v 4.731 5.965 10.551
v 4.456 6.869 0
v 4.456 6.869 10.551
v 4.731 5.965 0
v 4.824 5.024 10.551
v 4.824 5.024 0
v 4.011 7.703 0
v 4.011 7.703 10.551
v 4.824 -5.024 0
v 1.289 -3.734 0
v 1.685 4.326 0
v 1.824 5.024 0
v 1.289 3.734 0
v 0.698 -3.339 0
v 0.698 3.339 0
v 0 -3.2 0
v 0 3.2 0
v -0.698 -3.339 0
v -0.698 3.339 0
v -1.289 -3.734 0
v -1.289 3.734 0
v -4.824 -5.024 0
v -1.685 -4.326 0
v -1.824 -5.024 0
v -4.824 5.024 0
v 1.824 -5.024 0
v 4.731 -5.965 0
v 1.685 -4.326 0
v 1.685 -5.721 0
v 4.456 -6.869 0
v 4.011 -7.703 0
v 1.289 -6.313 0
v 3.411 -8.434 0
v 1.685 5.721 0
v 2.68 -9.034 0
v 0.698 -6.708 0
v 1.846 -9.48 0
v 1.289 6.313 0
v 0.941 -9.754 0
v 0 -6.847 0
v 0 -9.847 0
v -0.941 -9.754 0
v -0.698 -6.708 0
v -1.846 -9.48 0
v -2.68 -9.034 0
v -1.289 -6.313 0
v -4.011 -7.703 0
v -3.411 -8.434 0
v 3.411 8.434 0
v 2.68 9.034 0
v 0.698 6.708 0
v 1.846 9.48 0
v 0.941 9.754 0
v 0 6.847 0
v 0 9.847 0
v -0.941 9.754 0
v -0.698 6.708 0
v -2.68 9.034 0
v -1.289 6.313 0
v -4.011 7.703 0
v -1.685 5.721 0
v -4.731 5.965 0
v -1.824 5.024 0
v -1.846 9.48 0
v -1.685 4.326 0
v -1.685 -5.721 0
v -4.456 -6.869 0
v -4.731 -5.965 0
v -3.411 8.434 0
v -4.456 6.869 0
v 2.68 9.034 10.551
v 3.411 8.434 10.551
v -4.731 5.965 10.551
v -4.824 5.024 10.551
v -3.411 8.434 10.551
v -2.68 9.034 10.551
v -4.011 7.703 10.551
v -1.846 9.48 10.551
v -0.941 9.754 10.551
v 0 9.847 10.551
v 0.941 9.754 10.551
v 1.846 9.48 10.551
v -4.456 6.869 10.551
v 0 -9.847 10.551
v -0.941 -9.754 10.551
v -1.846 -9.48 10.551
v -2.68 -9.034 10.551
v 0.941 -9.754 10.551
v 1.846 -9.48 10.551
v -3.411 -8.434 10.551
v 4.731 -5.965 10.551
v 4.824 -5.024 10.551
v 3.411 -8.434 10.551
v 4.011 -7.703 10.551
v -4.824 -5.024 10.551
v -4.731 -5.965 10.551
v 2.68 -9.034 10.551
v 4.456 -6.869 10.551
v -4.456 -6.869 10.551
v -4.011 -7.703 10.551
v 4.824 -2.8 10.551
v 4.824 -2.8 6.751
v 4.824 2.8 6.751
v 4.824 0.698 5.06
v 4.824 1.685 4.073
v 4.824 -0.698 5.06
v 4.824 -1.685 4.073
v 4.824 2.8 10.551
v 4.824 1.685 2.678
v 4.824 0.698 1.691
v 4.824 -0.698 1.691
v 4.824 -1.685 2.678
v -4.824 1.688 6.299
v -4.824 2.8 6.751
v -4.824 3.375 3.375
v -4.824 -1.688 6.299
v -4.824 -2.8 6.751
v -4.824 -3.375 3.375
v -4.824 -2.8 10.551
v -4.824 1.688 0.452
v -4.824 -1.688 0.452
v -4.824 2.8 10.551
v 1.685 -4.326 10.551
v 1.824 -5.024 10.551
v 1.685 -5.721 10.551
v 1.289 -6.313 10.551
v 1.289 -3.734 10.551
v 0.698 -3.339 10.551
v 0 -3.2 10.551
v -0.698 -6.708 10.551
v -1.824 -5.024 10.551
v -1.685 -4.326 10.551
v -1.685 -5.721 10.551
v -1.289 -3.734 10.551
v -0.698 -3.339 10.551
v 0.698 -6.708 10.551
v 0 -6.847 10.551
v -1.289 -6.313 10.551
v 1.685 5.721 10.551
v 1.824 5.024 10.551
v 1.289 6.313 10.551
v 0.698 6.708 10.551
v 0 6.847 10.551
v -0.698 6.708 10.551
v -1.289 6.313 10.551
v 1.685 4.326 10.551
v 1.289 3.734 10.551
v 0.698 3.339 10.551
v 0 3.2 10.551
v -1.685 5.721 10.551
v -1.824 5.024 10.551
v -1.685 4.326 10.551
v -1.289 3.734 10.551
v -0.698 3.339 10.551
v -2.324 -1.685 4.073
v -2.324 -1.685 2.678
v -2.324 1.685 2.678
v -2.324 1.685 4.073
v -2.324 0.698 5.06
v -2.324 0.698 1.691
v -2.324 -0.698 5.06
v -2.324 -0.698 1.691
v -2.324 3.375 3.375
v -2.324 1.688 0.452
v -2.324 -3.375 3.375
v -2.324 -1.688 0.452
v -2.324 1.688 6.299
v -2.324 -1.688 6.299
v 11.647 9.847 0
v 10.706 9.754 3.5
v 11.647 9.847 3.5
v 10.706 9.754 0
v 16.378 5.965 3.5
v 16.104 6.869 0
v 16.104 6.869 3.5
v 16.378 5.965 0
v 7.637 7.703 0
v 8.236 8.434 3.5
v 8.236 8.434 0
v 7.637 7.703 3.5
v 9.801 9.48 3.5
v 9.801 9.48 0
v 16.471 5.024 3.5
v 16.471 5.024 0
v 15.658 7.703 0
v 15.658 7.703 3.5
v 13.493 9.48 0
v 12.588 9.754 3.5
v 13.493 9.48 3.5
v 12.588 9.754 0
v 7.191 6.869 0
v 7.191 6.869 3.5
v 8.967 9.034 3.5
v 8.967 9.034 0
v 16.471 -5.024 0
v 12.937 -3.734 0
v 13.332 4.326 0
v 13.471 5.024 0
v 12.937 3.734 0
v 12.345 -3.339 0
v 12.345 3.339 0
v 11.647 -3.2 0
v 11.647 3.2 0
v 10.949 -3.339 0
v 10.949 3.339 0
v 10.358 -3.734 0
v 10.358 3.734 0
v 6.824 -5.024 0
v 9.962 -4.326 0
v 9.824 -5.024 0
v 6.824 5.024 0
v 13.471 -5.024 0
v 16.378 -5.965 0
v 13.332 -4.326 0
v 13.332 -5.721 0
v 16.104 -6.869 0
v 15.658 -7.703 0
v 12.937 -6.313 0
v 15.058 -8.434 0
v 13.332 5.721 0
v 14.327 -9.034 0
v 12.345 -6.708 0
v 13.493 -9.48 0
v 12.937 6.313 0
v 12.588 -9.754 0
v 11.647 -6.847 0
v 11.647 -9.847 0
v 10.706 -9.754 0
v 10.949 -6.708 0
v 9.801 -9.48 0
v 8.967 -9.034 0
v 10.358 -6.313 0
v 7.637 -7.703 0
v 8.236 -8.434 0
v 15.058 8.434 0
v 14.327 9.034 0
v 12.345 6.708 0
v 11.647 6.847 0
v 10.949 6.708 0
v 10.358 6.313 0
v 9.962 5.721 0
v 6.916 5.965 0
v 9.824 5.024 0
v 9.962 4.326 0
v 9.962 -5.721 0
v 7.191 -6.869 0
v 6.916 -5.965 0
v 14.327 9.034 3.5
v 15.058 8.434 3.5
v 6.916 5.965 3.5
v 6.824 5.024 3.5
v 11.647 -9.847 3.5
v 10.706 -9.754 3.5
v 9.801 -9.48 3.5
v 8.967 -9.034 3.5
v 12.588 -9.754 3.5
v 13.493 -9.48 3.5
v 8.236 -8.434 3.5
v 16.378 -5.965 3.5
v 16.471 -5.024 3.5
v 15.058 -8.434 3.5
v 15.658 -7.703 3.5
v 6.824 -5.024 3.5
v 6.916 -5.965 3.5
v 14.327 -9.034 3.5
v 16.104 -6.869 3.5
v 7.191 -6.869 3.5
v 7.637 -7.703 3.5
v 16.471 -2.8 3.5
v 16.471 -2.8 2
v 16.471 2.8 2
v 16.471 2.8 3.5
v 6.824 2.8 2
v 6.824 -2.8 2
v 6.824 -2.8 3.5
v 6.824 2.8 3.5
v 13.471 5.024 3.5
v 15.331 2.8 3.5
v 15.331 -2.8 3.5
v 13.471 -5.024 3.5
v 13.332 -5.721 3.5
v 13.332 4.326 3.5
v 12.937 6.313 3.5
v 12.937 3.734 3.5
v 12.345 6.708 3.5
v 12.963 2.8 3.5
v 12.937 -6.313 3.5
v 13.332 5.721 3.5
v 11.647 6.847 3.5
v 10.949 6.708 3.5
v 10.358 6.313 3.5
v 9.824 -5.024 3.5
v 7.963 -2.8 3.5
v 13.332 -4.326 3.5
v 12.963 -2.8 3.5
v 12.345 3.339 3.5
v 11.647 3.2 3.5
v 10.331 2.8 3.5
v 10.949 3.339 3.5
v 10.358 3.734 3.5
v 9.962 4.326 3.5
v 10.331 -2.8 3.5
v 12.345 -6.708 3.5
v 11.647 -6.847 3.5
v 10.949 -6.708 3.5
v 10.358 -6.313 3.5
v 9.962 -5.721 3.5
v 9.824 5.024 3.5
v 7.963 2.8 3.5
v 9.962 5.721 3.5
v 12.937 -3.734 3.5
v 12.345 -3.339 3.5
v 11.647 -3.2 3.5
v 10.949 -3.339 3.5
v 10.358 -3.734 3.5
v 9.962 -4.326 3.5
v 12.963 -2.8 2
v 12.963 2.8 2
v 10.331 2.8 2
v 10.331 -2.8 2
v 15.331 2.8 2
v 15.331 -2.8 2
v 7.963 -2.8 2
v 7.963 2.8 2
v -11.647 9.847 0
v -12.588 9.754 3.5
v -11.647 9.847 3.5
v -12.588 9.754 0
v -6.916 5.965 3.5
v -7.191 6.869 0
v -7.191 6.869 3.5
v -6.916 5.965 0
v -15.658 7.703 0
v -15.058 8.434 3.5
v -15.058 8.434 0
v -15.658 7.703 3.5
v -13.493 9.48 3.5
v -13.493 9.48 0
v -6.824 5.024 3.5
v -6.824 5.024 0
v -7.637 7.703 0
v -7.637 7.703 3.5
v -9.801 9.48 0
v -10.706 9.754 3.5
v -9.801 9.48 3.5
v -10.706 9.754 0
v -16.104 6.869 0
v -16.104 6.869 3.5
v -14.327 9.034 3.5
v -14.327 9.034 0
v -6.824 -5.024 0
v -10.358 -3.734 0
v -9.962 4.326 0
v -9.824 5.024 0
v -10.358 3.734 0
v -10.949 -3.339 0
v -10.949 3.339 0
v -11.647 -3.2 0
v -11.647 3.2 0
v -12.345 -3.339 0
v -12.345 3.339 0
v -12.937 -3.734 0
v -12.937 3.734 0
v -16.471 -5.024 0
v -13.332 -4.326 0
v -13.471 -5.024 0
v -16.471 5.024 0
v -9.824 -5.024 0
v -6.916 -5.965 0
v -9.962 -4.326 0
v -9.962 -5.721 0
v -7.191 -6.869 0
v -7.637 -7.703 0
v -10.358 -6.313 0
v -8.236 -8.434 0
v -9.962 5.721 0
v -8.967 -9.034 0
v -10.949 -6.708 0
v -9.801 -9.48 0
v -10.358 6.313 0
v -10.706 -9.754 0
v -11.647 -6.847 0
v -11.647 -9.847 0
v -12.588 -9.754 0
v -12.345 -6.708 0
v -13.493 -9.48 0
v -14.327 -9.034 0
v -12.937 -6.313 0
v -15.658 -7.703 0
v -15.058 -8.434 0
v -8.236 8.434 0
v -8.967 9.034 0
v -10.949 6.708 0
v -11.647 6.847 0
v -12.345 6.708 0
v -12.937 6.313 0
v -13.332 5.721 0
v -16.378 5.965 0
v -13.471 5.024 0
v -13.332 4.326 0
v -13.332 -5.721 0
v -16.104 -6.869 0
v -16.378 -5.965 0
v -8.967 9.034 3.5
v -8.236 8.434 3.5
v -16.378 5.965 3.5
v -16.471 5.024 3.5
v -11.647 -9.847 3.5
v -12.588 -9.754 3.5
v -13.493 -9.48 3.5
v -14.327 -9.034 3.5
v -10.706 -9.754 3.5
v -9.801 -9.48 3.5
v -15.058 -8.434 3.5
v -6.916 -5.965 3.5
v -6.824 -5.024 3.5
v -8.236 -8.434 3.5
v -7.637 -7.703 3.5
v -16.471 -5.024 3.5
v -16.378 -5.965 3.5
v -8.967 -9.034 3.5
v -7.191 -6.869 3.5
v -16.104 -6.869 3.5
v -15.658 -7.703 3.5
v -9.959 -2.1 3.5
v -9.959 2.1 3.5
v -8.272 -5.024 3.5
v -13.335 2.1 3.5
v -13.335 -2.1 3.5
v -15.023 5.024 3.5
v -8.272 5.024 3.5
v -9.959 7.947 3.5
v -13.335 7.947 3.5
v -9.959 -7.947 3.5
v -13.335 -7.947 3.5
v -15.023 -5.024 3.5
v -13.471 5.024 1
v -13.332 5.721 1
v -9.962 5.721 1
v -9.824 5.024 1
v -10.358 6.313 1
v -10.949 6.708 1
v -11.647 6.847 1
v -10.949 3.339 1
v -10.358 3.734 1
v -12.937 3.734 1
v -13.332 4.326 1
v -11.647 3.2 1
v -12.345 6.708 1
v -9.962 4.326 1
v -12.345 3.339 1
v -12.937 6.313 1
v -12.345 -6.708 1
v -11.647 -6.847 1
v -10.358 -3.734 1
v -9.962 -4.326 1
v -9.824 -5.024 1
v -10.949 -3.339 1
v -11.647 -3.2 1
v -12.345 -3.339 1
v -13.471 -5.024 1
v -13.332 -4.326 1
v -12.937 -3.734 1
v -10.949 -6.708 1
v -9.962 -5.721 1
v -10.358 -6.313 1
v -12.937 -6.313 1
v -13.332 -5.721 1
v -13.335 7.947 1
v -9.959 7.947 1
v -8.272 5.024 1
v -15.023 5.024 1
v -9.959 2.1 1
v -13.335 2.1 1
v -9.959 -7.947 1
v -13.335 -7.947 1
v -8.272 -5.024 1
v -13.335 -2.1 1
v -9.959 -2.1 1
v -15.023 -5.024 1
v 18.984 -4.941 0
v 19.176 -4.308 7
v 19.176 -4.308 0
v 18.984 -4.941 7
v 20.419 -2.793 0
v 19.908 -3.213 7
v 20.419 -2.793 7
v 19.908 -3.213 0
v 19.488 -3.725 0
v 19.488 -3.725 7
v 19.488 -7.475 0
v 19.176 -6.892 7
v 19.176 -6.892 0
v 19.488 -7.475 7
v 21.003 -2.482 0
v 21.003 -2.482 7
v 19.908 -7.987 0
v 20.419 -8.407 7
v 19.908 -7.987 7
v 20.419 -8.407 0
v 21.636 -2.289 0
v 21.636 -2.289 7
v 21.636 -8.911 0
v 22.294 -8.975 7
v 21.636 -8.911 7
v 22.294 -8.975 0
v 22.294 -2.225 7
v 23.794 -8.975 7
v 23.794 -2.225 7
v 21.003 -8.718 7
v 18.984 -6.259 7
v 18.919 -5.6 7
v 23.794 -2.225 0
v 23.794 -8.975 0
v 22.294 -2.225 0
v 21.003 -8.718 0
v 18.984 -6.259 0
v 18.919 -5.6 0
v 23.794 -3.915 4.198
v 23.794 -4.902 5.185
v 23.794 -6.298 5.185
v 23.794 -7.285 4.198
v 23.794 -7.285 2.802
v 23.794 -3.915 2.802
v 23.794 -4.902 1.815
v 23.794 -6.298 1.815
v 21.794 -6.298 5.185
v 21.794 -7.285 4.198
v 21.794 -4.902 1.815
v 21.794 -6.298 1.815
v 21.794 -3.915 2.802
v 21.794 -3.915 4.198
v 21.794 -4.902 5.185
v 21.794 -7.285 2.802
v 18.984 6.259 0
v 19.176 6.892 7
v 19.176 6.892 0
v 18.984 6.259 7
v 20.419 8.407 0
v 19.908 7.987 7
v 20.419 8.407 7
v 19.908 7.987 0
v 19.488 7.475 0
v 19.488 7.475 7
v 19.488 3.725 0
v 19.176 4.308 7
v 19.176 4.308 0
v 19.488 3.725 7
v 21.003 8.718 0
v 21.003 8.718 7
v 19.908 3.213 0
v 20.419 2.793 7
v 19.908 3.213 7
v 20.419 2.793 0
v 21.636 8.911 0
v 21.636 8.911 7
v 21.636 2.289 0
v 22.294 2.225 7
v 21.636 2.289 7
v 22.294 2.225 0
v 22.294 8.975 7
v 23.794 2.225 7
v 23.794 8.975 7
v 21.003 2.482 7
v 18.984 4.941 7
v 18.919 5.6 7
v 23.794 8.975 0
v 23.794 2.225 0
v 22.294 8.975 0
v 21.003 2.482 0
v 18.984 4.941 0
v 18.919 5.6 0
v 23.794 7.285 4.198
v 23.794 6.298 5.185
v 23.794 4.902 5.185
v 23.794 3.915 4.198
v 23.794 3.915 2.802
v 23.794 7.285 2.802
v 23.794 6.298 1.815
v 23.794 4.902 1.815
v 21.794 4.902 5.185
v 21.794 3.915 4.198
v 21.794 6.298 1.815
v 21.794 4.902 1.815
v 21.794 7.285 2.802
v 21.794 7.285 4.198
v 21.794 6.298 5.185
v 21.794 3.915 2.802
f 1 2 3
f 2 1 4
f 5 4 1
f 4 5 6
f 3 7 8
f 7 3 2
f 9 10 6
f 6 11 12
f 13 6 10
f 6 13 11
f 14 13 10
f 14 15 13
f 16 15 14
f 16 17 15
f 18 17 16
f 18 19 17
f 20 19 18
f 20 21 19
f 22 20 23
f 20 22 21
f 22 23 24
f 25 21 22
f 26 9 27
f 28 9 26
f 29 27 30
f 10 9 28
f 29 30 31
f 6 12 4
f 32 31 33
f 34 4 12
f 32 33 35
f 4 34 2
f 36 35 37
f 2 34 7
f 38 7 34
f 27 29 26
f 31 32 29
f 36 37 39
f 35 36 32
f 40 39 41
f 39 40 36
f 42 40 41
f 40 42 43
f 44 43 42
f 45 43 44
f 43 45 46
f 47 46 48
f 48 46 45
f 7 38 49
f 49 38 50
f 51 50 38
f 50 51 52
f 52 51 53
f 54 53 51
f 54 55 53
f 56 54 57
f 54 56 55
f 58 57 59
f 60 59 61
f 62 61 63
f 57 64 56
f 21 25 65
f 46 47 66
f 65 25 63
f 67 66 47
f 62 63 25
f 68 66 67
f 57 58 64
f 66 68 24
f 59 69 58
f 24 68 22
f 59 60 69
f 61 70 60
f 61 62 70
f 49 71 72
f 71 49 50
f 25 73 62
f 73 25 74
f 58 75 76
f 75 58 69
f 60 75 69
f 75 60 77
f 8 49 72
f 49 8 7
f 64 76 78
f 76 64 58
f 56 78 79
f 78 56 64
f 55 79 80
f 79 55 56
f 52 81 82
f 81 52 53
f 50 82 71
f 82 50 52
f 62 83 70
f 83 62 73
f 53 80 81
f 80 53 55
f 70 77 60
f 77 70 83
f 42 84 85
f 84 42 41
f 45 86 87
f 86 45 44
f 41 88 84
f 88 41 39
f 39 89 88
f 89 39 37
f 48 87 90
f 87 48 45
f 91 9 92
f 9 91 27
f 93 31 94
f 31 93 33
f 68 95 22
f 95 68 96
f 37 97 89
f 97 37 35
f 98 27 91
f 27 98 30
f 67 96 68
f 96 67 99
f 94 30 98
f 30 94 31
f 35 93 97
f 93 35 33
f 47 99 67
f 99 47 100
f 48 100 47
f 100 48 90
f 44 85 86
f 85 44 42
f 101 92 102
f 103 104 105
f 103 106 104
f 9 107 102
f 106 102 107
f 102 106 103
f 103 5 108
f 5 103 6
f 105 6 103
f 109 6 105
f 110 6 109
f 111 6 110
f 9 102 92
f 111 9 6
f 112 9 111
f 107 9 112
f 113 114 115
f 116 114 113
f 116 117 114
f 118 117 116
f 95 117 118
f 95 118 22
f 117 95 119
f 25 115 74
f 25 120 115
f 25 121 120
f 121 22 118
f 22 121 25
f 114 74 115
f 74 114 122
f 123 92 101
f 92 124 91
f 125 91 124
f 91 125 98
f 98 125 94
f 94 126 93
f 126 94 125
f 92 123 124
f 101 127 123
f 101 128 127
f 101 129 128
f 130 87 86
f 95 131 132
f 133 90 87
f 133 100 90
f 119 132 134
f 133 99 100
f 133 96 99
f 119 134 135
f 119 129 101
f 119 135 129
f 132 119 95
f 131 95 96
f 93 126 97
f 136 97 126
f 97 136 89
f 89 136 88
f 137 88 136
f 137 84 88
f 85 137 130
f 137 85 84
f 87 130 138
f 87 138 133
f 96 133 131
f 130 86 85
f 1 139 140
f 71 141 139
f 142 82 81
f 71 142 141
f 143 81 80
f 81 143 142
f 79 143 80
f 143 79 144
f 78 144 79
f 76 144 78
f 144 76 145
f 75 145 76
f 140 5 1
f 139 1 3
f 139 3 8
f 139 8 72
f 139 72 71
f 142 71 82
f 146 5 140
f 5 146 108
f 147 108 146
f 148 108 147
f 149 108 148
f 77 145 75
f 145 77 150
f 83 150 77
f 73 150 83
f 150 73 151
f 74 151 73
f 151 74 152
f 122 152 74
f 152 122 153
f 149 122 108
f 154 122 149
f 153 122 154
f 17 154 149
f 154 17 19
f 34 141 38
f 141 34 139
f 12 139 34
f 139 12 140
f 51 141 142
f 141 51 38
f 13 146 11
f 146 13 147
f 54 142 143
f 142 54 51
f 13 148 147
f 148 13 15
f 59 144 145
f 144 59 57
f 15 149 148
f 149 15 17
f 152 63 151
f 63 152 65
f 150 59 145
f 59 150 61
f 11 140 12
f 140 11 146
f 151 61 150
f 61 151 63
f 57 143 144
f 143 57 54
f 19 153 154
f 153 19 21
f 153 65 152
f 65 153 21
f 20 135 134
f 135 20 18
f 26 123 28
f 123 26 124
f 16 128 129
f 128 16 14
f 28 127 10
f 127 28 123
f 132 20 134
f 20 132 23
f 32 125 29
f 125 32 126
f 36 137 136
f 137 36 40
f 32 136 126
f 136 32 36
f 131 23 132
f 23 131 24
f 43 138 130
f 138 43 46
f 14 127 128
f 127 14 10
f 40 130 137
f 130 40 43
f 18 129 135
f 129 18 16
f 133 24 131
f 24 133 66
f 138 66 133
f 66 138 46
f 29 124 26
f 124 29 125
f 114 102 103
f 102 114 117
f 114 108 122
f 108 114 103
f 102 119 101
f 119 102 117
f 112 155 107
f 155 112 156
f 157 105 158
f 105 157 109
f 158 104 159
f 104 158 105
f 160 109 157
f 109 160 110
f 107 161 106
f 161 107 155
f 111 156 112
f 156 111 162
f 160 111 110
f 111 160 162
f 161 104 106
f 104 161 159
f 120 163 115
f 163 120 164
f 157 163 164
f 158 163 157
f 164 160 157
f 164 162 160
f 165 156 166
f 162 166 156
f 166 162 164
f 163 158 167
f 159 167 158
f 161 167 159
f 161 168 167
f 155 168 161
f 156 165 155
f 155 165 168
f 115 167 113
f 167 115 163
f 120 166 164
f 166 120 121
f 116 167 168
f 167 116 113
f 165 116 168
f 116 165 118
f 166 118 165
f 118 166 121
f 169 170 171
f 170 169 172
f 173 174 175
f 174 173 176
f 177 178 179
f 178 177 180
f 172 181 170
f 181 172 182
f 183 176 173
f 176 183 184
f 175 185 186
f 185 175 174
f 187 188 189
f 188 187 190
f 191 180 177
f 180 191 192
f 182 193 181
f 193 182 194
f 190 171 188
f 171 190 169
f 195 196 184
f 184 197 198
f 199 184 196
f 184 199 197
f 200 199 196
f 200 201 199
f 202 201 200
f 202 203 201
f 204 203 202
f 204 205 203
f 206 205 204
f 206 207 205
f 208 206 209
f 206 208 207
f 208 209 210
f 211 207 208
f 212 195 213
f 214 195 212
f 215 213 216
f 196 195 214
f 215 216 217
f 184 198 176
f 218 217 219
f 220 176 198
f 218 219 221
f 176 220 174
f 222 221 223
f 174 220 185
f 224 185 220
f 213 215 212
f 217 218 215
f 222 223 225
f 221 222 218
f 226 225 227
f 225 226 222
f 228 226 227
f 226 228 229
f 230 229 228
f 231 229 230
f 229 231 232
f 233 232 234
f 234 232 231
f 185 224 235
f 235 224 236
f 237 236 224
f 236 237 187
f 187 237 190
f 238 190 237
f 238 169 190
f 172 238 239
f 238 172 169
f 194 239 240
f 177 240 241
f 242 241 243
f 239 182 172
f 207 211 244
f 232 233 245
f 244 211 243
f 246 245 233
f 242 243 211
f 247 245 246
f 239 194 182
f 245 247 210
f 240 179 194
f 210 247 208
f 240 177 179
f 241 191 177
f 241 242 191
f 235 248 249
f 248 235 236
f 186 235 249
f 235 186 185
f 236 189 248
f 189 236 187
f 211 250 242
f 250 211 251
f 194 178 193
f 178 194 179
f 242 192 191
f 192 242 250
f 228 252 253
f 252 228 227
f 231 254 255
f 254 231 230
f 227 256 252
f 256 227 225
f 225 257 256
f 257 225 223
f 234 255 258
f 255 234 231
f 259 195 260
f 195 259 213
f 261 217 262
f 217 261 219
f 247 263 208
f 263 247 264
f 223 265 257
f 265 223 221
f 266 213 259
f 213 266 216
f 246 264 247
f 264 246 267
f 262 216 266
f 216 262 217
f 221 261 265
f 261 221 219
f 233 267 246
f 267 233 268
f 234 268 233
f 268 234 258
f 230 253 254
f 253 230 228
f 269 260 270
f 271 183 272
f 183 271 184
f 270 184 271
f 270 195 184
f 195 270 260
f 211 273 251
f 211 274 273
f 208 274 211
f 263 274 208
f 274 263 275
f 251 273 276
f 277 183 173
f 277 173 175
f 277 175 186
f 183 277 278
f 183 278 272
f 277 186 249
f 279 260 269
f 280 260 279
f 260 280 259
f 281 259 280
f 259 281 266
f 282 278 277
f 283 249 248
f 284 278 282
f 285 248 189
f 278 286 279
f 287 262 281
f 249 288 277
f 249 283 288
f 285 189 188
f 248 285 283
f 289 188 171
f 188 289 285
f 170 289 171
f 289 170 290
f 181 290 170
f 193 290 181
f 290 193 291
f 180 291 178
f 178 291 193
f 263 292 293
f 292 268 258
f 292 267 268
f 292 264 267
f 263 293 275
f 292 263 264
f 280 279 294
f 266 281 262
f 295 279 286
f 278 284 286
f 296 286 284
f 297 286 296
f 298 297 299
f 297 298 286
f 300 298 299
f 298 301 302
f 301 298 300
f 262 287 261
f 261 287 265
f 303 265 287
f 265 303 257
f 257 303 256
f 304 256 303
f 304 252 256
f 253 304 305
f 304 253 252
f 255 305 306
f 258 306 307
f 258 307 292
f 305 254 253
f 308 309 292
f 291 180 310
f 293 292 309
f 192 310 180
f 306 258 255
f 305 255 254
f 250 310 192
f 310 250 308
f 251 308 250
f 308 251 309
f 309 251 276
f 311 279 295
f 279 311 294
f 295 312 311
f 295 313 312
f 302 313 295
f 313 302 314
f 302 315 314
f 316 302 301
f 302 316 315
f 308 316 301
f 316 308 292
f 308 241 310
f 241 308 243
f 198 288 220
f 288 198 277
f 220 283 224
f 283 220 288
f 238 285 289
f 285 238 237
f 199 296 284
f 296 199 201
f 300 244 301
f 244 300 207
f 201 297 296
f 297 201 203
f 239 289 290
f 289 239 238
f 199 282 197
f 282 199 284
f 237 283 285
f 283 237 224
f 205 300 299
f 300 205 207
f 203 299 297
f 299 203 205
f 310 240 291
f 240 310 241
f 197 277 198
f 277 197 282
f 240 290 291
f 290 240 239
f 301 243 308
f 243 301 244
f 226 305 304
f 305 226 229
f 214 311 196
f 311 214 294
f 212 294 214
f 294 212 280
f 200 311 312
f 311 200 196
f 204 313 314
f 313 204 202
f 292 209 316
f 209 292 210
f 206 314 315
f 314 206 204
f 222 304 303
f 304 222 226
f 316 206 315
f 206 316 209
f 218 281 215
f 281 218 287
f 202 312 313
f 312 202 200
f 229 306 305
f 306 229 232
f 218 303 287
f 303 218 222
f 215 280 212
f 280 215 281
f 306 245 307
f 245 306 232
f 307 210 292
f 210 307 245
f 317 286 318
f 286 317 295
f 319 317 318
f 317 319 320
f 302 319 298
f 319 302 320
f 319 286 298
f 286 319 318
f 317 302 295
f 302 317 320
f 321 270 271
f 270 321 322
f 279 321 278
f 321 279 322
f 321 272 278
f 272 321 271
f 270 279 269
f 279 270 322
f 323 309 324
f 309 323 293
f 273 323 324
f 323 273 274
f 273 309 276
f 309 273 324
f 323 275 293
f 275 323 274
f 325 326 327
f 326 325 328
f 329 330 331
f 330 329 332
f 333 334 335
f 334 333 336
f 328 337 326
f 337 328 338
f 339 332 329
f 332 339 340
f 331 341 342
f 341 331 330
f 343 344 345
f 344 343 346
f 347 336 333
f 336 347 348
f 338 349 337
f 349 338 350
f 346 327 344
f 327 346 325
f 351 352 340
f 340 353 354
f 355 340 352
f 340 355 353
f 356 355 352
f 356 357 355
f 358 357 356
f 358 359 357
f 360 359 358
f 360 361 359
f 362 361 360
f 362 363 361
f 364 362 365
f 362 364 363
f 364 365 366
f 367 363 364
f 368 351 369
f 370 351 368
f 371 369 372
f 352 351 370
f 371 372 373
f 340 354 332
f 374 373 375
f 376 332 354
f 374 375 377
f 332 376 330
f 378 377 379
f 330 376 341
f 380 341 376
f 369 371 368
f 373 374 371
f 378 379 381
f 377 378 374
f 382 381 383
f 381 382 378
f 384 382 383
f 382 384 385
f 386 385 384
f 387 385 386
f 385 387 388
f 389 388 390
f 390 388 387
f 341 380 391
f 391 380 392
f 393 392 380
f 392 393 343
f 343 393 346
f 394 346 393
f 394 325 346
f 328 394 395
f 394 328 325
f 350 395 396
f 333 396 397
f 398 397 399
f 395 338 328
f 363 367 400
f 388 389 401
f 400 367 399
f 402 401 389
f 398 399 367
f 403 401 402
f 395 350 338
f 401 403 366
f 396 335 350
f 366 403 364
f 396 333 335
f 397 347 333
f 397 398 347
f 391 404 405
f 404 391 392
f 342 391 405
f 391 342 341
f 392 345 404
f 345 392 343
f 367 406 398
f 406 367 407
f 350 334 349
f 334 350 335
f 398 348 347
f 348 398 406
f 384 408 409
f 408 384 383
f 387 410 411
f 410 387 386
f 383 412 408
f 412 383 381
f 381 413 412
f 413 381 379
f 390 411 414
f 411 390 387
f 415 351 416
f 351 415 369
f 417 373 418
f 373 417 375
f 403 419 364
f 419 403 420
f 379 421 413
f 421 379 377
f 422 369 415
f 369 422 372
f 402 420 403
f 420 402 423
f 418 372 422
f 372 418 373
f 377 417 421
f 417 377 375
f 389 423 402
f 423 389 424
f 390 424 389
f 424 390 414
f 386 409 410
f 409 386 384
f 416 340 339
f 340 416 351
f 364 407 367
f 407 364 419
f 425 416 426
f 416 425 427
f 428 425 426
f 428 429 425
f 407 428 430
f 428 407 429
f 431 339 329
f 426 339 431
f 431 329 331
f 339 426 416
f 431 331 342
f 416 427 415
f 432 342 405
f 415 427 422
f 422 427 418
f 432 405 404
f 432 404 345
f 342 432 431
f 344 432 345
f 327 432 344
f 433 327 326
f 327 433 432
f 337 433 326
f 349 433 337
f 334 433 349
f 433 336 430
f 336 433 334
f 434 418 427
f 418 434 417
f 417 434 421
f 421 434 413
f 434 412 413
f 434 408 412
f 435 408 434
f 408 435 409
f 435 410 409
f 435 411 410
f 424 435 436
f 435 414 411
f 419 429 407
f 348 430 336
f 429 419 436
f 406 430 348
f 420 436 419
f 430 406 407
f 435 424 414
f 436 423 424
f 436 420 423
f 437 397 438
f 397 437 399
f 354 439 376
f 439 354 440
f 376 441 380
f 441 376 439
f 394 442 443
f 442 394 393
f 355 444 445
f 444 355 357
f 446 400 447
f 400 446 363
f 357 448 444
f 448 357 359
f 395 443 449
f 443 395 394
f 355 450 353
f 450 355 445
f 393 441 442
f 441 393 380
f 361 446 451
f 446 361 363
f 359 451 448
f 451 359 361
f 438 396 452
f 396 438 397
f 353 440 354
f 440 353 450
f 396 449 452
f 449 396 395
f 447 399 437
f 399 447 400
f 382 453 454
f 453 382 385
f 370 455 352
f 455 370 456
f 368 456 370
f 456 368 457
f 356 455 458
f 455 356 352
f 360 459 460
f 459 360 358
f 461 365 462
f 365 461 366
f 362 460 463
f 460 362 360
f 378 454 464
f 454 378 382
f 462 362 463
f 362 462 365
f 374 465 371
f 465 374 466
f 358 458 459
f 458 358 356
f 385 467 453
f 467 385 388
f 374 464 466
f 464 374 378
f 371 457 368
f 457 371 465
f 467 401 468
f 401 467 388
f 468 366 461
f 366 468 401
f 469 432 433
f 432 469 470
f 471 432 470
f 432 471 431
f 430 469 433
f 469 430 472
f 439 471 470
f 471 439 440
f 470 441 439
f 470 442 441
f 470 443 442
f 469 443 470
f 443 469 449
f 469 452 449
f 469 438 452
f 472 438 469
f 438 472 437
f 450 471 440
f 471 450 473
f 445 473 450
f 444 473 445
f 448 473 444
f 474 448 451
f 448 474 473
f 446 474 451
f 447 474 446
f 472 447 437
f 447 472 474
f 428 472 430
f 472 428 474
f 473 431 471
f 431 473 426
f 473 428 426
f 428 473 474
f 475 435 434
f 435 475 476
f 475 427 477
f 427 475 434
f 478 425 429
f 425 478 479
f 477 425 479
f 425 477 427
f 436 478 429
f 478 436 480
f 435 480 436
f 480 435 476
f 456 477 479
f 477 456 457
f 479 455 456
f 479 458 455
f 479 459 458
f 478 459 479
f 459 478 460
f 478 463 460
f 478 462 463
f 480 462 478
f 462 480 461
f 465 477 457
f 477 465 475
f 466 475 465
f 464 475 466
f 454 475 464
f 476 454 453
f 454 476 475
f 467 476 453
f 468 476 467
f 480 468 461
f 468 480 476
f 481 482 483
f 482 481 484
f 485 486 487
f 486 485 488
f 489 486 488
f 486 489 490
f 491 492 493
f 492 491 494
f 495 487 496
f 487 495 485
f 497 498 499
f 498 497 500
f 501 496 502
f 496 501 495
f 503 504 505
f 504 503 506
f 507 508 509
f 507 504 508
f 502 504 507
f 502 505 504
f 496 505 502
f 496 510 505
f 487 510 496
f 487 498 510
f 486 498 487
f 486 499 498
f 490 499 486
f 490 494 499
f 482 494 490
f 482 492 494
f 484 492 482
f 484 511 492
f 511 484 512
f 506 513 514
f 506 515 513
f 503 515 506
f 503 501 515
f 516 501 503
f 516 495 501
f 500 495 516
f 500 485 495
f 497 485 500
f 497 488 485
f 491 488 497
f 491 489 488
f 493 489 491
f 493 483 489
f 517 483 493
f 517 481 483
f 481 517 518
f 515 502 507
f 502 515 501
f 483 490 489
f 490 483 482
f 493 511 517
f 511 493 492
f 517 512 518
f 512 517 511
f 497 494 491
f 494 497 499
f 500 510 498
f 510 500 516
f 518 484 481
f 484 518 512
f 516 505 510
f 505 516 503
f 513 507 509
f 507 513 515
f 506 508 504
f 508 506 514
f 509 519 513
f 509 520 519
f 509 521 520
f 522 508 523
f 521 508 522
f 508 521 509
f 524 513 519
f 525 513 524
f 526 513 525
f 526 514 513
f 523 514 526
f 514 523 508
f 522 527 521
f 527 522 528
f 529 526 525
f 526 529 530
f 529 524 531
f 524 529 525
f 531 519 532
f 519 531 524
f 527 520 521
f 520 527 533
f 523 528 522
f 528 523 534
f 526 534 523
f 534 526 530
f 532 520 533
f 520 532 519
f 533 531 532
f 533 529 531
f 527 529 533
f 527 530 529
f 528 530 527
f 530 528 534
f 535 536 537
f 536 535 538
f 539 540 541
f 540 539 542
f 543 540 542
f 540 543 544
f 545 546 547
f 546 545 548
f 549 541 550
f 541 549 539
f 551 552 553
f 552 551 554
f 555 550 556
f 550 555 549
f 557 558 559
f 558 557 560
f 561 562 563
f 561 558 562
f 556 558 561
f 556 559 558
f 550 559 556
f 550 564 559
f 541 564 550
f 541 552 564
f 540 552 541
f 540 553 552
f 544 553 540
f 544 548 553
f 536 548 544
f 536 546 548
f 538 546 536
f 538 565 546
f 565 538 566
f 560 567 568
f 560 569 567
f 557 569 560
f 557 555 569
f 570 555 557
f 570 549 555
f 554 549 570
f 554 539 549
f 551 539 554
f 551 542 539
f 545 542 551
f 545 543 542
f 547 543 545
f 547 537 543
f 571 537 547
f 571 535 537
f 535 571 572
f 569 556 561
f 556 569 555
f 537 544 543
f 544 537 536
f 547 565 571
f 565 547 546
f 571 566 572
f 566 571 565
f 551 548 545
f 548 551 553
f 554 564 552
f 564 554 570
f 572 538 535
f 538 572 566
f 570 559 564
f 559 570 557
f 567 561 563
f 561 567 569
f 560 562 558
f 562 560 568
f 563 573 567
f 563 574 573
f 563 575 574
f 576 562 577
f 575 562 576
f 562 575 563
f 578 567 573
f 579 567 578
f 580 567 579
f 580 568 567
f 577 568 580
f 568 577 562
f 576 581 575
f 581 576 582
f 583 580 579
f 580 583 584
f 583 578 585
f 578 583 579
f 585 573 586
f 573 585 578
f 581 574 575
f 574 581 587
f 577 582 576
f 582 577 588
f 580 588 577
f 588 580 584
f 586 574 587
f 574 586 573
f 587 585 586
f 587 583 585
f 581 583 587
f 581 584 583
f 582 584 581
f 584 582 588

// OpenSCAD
//Parametric Prusa Y-axis belt tensioner with ram by triffid_hunter is licensed under the Attribution - Share Alike - Creative Commons license.

belt_pitch = 5;
belt_width = 5.6;
belt_height = 3.8;

ram_length = 1.5;

m3_diameter = 3 / cos(180 / 8) + 0.4;
m3_radius = m3_diameter / 2;

m3_nut_diameter = 5.5 / cos(180 / 6) + 0.4;
m3_nut_radius = m3_nut_diameter / 2;

m3_nut_depth = 2.5;

wall = 3;
extrusion_width = 0.4;

clamp_height = 3.5;
belt_depth = 2;

ram_height = 7;

module clamp(h=10) {
	translate([-wall - m3_radius, 0, 0])
	difference() {
		intersection() {
			translate([0, belt_width / -2 - m3_diameter - wall - extrusion_width * 2, 0]) cube([wall * 2 + m3_diameter, belt_width + m3_diameter * 2 + wall * 2 + extrusion_width * 4, h]);
			union() {
				translate([wall + m3_radius, belt_width / 2 + m3_radius + extrusion_width, 0]) cylinder(r=wall + m3_radius, h=h + 1, $fn=32);
				translate([wall + m3_radius, -belt_width / 2 - m3_radius - extrusion_width, 0]) cylinder(r=wall + m3_radius, h=h + 1, $fn=32);
				translate([0, -belt_width / 2 - m3_radius - extrusion_width, 0]) cube([wall * 2 + m3_diameter, belt_width + m3_diameter  + extrusion_width * 2, h + 1]);
			}
		}
		translate([wall + m3_radius, belt_width / 2 + m3_radius + extrusion_width, -1]) cylinder(r=m3_radius, h=h + 2, $fn=16);
		translate([wall + m3_radius, belt_width / -2 - m3_radius - extrusion_width, -1]) cylinder(r=m3_radius, h=h + 2, $fn=16);
	}
}

module clamp_base() {
	difference() {
		clamp(belt_height + m3_nut_diameter);

		translate([-1 - wall - m3_radius, -belt_width / 2, m3_nut_diameter]) cube([wall * 4, belt_width, belt_height + 1]);
		translate([-1 - wall - m3_radius, 0, m3_nut_radius]) rotate([0, 90, 0]) rotate([0, 0, 180 / 8]) cylinder(r=m3_radius, h=wall * 4, $fn=8);
		translate([-1 - wall - m3_radius, 0, m3_nut_radius]) rotate([0, 90, 0]) rotate([0, 0, 180 / 6]) cylinder(r=m3_nut_radius, h=1 + m3_nut_depth, $fn=6);
	}
}

module clamp_top() {
	difference() {
		clamp(clamp_height);
		translate([ - belt_pitch / 3.8, -belt_width / 2, wall - 1]) cube([belt_pitch / 1.9, belt_width, 5]);
		translate([- belt_pitch / 3.8 + belt_pitch, -belt_width / 2, wall - 1]) cube([belt_pitch / 1.9, belt_width, 5]);
		translate([- belt_pitch / 3.8 - belt_pitch, -belt_width / 2, wall - 1]) cube([belt_pitch / 1.9, belt_width, 5]);
	}
}

module clamp_trap() {
	difference() {
		clamp(clamp_height);
		translate([0, belt_width / 2 + m3_radius + extrusion_width, max(clamp_height - m3_nut_depth, 1)]) cylinder(r=m3_nut_radius, h=m3_nut_depth + 1, $fn=6);
		translate([0, belt_width / -2 - m3_radius - extrusion_width, max(clamp_height - m3_nut_depth, 1)]) cylinder(r=m3_nut_radius, h=m3_nut_depth + 1, $fn=6);
	}
}

module ram() {
	difference() {
		union() {
			cylinder(r=m3_nut_radius, h=ram_height, $fn=32);
			translate([0, -m3_nut_radius, 0]) cube([ram_length + 0.1, m3_nut_diameter, ram_height]);
		}
		translate([ram_length, -m3_nut_radius - 1, -1]) cube([m3_nut_diameter + 2, m3_nut_diameter + 2, ram_height + 2]);
		translate([-0.5, 0, ram_height / 2]) rotate([0, 90, 0]) rotate([0, 0, 180 / 8]) cylinder(r=m3_radius, h=2 + ram_length, $fn=8);
	}
}

clamp_base();
translate([wall * 2 + m3_diameter + 2, 0, 0]) clamp_top();
translate([-wall * 2 - m3_diameter - 2, 0, 0]) clamp_trap();
translate([wall * 4 + m3_diameter * 2 + 3, -belt_width, 0]) ram();
translate([wall * 4 + m3_diameter * 2 + 3, belt_width, 0]) ram();
